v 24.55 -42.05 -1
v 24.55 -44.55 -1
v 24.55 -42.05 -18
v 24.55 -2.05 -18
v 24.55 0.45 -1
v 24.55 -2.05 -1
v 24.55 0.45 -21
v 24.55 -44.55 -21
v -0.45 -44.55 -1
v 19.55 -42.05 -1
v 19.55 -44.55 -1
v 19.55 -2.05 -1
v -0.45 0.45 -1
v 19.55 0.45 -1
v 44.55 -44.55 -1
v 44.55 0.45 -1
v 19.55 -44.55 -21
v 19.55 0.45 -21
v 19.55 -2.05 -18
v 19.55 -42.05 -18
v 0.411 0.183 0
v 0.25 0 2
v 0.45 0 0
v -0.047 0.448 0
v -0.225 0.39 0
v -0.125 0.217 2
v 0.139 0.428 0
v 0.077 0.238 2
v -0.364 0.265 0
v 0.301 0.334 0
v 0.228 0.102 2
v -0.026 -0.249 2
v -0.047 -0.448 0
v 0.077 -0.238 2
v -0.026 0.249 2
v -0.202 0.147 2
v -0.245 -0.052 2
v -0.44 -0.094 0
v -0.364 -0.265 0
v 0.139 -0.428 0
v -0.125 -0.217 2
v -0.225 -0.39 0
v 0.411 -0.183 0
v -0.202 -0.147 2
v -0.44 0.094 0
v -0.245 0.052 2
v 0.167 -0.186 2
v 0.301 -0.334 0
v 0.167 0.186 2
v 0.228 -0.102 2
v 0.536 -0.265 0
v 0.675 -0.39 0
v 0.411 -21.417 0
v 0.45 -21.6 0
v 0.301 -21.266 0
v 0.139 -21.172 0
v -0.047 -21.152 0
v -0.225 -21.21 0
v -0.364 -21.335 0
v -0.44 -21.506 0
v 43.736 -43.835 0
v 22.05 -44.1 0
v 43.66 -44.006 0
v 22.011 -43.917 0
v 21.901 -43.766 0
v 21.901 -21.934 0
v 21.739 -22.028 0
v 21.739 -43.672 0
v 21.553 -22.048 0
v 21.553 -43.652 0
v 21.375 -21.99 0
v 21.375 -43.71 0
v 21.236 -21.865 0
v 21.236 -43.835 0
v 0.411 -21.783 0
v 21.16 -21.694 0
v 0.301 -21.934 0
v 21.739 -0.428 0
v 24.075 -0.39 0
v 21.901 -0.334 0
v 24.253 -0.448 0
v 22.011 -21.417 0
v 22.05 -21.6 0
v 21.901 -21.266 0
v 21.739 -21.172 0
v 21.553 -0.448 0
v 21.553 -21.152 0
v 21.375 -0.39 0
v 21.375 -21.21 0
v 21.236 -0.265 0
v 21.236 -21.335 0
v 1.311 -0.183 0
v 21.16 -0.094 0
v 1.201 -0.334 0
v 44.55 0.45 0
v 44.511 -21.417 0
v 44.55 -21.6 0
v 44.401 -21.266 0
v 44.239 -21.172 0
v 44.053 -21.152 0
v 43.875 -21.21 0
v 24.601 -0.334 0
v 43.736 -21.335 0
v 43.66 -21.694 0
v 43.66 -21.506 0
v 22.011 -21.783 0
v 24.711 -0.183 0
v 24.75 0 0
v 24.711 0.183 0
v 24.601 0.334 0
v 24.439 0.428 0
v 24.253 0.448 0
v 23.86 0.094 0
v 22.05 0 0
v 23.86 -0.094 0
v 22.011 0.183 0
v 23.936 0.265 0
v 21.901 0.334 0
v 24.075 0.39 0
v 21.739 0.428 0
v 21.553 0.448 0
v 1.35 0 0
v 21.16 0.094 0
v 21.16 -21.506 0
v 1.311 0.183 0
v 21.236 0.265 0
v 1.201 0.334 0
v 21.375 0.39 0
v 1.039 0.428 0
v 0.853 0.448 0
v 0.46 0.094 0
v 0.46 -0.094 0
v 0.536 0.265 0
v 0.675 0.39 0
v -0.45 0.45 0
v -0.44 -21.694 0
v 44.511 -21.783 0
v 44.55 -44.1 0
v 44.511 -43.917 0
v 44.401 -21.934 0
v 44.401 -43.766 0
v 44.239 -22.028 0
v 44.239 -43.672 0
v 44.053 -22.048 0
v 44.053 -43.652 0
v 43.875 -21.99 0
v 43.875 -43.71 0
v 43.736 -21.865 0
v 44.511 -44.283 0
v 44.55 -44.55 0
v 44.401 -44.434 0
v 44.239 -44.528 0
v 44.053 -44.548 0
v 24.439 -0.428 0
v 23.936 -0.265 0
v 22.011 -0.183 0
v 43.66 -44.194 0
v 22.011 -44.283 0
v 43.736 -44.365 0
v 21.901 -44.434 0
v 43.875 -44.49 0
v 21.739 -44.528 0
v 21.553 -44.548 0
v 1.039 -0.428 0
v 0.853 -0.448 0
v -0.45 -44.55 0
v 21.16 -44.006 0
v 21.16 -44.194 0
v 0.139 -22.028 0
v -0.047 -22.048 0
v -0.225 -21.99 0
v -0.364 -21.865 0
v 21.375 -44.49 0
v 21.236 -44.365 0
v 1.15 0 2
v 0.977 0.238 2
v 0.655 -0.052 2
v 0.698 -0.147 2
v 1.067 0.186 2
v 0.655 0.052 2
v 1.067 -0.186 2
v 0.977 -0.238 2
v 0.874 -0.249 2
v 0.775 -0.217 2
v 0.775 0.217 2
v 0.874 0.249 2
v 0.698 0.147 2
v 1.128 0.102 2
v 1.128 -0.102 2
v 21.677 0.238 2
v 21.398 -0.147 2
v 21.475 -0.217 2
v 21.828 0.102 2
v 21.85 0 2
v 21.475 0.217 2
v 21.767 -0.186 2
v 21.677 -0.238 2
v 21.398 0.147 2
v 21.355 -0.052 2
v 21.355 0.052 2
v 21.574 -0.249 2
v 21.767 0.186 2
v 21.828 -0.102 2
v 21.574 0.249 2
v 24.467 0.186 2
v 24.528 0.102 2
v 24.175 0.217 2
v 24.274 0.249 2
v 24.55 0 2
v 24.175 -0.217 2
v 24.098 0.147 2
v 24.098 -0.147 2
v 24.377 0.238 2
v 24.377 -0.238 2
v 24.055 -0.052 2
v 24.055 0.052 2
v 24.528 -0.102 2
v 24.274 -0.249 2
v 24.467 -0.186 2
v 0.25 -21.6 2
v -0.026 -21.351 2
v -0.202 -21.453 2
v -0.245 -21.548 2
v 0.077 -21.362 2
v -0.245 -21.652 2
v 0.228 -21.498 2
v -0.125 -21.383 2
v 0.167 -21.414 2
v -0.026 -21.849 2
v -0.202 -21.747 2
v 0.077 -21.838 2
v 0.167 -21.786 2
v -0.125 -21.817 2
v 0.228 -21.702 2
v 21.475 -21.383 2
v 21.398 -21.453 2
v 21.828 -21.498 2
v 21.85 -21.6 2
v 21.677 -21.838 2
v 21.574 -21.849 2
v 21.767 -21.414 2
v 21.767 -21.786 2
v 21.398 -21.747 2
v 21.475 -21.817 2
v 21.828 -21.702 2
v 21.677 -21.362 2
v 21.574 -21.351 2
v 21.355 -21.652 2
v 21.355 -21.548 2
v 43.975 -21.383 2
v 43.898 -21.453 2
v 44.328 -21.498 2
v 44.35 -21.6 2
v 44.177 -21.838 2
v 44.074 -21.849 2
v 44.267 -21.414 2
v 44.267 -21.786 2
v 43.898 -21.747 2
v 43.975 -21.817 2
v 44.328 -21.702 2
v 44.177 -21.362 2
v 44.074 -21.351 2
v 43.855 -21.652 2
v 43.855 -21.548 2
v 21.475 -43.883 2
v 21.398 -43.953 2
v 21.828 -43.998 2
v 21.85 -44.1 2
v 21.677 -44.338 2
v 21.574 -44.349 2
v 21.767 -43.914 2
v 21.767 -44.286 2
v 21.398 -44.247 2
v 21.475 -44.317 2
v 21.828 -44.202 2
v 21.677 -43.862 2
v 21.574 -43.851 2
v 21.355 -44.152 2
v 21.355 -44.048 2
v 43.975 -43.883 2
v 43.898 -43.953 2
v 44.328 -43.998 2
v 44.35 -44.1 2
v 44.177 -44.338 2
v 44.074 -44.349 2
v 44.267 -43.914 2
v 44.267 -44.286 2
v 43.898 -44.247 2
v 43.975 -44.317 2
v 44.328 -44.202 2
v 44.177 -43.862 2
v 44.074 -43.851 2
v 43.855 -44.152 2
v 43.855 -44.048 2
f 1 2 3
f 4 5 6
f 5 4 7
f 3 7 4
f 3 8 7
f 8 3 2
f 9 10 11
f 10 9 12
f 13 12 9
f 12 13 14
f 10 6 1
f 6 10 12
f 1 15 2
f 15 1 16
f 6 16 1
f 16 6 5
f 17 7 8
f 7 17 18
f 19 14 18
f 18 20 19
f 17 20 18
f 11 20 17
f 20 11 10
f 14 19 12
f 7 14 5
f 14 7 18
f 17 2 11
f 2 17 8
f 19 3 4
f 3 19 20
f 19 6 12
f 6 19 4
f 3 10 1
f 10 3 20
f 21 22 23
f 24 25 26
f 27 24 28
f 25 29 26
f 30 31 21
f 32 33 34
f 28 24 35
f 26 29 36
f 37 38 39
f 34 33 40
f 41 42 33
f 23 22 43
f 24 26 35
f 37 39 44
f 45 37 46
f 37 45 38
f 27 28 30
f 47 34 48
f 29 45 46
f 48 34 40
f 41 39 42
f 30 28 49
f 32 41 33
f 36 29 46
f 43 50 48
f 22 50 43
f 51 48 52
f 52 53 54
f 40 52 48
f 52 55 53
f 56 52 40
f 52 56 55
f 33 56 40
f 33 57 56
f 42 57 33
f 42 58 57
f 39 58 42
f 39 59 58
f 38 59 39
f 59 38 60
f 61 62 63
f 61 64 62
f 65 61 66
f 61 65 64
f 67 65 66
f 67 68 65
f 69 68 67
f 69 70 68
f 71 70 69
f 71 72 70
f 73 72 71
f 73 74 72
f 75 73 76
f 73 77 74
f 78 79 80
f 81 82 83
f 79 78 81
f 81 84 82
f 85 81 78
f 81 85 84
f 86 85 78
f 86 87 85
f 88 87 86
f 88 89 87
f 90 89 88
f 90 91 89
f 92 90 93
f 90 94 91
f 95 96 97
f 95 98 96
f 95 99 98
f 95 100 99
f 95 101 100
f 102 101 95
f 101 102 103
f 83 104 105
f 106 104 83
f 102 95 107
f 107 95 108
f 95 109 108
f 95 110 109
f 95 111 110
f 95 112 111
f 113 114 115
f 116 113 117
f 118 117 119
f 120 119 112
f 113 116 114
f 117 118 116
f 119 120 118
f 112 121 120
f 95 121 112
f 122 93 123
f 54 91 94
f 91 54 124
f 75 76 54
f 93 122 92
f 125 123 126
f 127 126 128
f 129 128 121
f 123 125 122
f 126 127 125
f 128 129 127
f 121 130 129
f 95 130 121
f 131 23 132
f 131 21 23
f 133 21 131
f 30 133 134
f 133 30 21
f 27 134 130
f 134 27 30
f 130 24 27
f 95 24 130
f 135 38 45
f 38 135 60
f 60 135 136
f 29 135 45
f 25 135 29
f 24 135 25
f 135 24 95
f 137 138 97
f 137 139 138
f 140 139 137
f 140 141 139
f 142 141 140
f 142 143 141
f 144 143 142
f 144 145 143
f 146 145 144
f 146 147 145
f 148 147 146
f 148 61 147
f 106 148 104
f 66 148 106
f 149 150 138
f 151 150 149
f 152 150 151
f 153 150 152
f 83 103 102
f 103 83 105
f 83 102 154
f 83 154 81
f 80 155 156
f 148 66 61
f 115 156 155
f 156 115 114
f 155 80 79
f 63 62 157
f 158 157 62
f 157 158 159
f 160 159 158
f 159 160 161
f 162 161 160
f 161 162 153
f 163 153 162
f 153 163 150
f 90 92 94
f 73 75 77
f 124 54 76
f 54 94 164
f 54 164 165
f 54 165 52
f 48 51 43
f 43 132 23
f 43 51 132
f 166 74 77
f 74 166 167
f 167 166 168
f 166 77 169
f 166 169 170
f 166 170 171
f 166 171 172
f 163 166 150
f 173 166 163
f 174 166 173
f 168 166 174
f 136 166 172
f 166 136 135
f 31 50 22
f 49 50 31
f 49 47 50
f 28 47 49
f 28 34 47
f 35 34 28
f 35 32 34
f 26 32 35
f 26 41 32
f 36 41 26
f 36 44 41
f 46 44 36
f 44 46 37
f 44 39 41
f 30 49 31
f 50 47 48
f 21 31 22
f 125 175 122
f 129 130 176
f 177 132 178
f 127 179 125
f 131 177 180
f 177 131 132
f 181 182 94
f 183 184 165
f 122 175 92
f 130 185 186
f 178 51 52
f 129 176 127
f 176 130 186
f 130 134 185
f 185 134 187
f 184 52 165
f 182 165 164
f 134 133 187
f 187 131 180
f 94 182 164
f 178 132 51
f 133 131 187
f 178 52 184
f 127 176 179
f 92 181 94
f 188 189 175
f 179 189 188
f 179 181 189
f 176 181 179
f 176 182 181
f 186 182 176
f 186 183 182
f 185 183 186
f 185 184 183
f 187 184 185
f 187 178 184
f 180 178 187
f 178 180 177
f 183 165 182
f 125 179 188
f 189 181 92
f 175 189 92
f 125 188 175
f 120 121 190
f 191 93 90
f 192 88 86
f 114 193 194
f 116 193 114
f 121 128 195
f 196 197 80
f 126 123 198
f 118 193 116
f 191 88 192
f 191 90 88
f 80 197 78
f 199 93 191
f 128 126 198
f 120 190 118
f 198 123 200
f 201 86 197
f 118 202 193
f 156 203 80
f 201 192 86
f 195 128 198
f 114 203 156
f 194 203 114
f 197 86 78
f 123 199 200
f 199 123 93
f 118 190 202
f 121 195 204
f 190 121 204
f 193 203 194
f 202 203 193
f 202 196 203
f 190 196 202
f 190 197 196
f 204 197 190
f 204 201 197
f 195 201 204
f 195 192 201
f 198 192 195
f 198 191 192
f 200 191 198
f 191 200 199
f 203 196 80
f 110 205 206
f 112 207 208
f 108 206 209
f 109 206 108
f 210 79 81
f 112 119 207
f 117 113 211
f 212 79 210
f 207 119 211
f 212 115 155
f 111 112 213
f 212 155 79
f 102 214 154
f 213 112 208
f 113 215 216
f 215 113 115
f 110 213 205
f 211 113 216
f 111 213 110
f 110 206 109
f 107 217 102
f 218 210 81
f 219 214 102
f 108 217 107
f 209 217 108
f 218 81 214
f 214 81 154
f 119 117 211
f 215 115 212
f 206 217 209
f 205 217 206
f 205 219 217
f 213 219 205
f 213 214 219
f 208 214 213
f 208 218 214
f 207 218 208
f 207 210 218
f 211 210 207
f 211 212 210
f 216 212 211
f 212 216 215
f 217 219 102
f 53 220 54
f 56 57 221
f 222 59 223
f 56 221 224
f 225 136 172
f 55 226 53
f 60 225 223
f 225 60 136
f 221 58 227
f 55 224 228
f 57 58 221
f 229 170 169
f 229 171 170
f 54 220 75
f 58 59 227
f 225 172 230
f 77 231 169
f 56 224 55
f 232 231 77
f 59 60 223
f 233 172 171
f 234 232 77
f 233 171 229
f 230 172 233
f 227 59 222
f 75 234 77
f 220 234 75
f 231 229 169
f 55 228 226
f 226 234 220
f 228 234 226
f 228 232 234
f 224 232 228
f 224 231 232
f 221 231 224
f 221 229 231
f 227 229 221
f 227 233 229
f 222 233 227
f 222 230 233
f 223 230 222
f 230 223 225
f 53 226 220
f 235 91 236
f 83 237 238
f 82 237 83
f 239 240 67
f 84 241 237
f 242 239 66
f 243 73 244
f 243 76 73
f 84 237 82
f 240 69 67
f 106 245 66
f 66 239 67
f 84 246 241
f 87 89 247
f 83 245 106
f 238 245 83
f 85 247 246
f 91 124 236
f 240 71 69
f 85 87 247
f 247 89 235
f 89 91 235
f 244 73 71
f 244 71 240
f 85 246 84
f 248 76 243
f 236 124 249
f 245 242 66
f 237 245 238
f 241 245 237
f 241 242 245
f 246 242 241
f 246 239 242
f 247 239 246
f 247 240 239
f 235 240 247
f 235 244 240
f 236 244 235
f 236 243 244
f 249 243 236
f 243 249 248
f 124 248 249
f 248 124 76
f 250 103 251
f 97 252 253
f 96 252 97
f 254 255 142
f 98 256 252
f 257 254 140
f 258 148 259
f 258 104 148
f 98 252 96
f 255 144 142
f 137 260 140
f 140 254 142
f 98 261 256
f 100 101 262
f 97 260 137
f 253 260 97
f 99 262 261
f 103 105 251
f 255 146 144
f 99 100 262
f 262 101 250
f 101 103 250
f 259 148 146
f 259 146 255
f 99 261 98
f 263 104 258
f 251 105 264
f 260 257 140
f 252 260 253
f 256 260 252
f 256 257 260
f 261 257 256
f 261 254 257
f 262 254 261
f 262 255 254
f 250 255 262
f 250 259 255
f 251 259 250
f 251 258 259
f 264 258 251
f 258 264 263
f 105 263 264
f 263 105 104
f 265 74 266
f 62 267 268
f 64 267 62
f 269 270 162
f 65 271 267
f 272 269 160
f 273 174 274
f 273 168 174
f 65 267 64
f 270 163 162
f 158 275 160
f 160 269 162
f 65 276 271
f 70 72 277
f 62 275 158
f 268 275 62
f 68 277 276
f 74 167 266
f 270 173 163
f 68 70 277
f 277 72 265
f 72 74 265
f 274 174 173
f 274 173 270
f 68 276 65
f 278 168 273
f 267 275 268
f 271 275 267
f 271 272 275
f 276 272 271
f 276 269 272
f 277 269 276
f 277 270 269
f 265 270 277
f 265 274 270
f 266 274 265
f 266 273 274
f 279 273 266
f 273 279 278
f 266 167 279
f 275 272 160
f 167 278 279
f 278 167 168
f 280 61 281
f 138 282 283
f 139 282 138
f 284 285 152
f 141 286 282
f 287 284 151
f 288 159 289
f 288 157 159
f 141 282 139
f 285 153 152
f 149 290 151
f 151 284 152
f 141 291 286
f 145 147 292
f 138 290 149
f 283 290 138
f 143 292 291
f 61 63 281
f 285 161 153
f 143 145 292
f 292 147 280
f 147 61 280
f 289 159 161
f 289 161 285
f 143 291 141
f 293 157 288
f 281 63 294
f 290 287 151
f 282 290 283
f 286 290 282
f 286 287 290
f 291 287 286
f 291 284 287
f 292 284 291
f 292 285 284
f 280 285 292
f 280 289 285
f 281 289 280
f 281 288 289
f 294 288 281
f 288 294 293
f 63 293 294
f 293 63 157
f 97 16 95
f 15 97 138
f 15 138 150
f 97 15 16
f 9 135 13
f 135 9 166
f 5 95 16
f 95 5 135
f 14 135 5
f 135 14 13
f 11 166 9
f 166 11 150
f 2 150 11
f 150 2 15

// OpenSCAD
$fn=15;
gridLength = 45;
gridSquares = 50;
oneGridLength = gridLength / gridSquares;
platformThickness = 1;
handleThickness = 5;
handleHeight = 20;

module buildPlatform(){
  translate([22.05,-22.05, -0.5 * platformThickness])
  cube([45,45,platformThickness], center = true);  
    
}

module buildHandle(){
    translate([22.05,-22.05,-0.5 * handleHeight - platformThickness])
    difference(){
        cube([handleThickness, 45, handleHeight], center = true);
        translate([0,0,4])
        cube([handleThickness + 1, 40, 22], center = true);
    }
    
}   

module buildStamp(array){
  buildPlatform();
  buildHandle();
  
  for ( row=[0:1:gridSquares - 1]) {
    for ( col=[0:1:gridSquares - 1]) {
      if(array[row][col] == 1){
        translate([col * oneGridLength,row * -1 * oneGridLength,0])
        cylinder(h=2,d1=oneGridLength, d2 = 0.5);
      }   
    }
  }
  
    
}

buildStamp(receiver_array);

receiver_array = [[1, 1, 0, 0, 0, 0, 0, 0, 0, 0, 0, 0, 0, 0, 0, 0, 0, 0, 0, 0, 0, 0, 0, 0, 1, 0, 0, 1, 0, 0, 0, 0, 0, 0, 0, 0, 0, 0, 0, 0, 0, 0, 0, 0, 0, 0, 0, 0, 0, 0], [0, 0, 0, 0, 0, 0, 0, 0, 0, 0, 0, 0, 0, 0, 0, 0, 0, 0, 0, 0, 0, 0, 0, 0, 0, 0, 0, 0, 0, 0, 0, 0, 0, 0, 0, 0, 0, 0, 0, 0, 0, 0, 0, 0, 0, 0, 0, 0, 0, 0], [0, 0, 0, 0, 0, 0, 0, 0, 0, 0, 0, 0, 0, 0, 0, 0, 0, 0, 0, 0, 0, 0, 0, 0, 0, 0, 0, 0, 0, 0, 0, 0, 0, 0, 0, 0, 0, 0, 0, 0, 0, 0, 0, 0, 0, 0, 0, 0, 0, 0], [0, 0, 0, 0, 0, 0, 0, 0, 0, 0, 0, 0, 0, 0, 0, 0, 0, 0, 0, 0, 0, 0, 0, 0, 0, 0, 0, 0, 0, 0, 0, 0, 0, 0, 0, 0, 0, 0, 0, 0, 0, 0, 0, 0, 0, 0, 0, 0, 0, 0], [0, 0, 0, 0, 0, 0, 0, 0, 0, 0, 0, 0, 0, 0, 0, 0, 0, 0, 0, 0, 0, 0, 0, 0, 0, 0, 0, 0, 0, 0, 0, 0, 0, 0, 0, 0, 0, 0, 0, 0, 0, 0, 0, 0, 0, 0, 0, 0, 0, 0], [0, 0, 0, 0, 0, 0, 0, 0, 0, 0, 0, 0, 0, 0, 0, 0, 0, 0, 0, 0, 0, 0, 0, 0, 0, 0, 0, 0, 0, 0, 0, 0, 0, 0, 0, 0, 0, 0, 0, 0, 0, 0, 0, 0, 0, 0, 0, 0, 0, 0], [0, 0, 0, 0, 0, 0, 0, 0, 0, 0, 0, 0, 0, 0, 0, 0, 0, 0, 0, 0, 0, 0, 0, 0, 0, 0, 0, 0, 0, 0, 0, 0, 0, 0, 0, 0, 0, 0, 0, 0, 0, 0, 0, 0, 0, 0, 0, 0, 0, 0], [0, 0, 0, 0, 0, 0, 0, 0, 0, 0, 0, 0, 0, 0, 0, 0, 0, 0, 0, 0, 0, 0, 0, 0, 0, 0, 0, 0, 0, 0, 0, 0, 0, 0, 0, 0, 0, 0, 0, 0, 0, 0, 0, 0, 0, 0, 0, 0, 0, 0], [0, 0, 0, 0, 0, 0, 0, 0, 0, 0, 0, 0, 0, 0, 0, 0, 0, 0, 0, 0, 0, 0, 0, 0, 0, 0, 0, 0, 0, 0, 0, 0, 0, 0, 0, 0, 0, 0, 0, 0, 0, 0, 0, 0, 0, 0, 0, 0, 0, 0], [0, 0, 0, 0, 0, 0, 0, 0, 0, 0, 0, 0, 0, 0, 0, 0, 0, 0, 0, 0, 0, 0, 0, 0, 0, 0, 0, 0, 0, 0, 0, 0, 0, 0, 0, 0, 0, 0, 0, 0, 0, 0, 0, 0, 0, 0, 0, 0, 0, 0], [0, 0, 0, 0, 0, 0, 0, 0, 0, 0, 0, 0, 0, 0, 0, 0, 0, 0, 0, 0, 0, 0, 0, 0, 0, 0, 0, 0, 0, 0, 0, 0, 0, 0, 0, 0, 0, 0, 0, 0, 0, 0, 0, 0, 0, 0, 0, 0, 0, 0], [0, 0, 0, 0, 0, 0, 0, 0, 0, 0, 0, 0, 0, 0, 0, 0, 0, 0, 0, 0, 0, 0, 0, 0, 0, 0, 0, 0, 0, 0, 0, 0, 0, 0, 0, 0, 0, 0, 0, 0, 0, 0, 0, 0, 0, 0, 0, 0, 0, 0], [0, 0, 0, 0, 0, 0, 0, 0, 0, 0, 0, 0, 0, 0, 0, 0, 0, 0, 0, 0, 0, 0, 0, 0, 0, 0, 0, 0, 0, 0, 0, 0, 0, 0, 0, 0, 0, 0, 0, 0, 0, 0, 0, 0, 0, 0, 0, 0, 0, 0], [0, 0, 0, 0, 0, 0, 0, 0, 0, 0, 0, 0, 0, 0, 0, 0, 0, 0, 0, 0, 0, 0, 0, 0, 0, 0, 0, 0, 0, 0, 0, 0, 0, 0, 0, 0, 0, 0, 0, 0, 0, 0, 0, 0, 0, 0, 0, 0, 0, 0], [0, 0, 0, 0, 0, 0, 0, 0, 0, 0, 0, 0, 0, 0, 0, 0, 0, 0, 0, 0, 0, 0, 0, 0, 0, 0, 0, 0, 0, 0, 0, 0, 0, 0, 0, 0, 0, 0, 0, 0, 0, 0, 0, 0, 0, 0, 0, 0, 0, 0], [0, 0, 0, 0, 0, 0, 0, 0, 0, 0, 0, 0, 0, 0, 0, 0, 0, 0, 0, 0, 0, 0, 0, 0, 0, 0, 0, 0, 0, 0, 0, 0, 0, 0, 0, 0, 0, 0, 0, 0, 0, 0, 0, 0, 0, 0, 0, 0, 0, 0], [0, 0, 0, 0, 0, 0, 0, 0, 0, 0, 0, 0, 0, 0, 0, 0, 0, 0, 0, 0, 0, 0, 0, 0, 0, 0, 0, 0, 0, 0, 0, 0, 0, 0, 0, 0, 0, 0, 0, 0, 0, 0, 0, 0, 0, 0, 0, 0, 0, 0], [0, 0, 0, 0, 0, 0, 0, 0, 0, 0, 0, 0, 0, 0, 0, 0, 0, 0, 0, 0, 0, 0, 0, 0, 0, 0, 0, 0, 0, 0, 0, 0, 0, 0, 0, 0, 0, 0, 0, 0, 0, 0, 0, 0, 0, 0, 0, 0, 0, 0], [0, 0, 0, 0, 0, 0, 0, 0, 0, 0, 0, 0, 0, 0, 0, 0, 0, 0, 0, 0, 0, 0, 0, 0, 0, 0, 0, 0, 0, 0, 0, 0, 0, 0, 0, 0, 0, 0, 0, 0, 0, 0, 0, 0, 0, 0, 0, 0, 0, 0], [0, 0, 0, 0, 0, 0, 0, 0, 0, 0, 0, 0, 0, 0, 0, 0, 0, 0, 0, 0, 0, 0, 0, 0, 0, 0, 0, 0, 0, 0, 0, 0, 0, 0, 0, 0, 0, 0, 0, 0, 0, 0, 0, 0, 0, 0, 0, 0, 0, 0], [0, 0, 0, 0, 0, 0, 0, 0, 0, 0, 0, 0, 0, 0, 0, 0, 0, 0, 0, 0, 0, 0, 0, 0, 0, 0, 0, 0, 0, 0, 0, 0, 0, 0, 0, 0, 0, 0, 0, 0, 0, 0, 0, 0, 0, 0, 0, 0, 0, 0], [0, 0, 0, 0, 0, 0, 0, 0, 0, 0, 0, 0, 0, 0, 0, 0, 0, 0, 0, 0, 0, 0, 0, 0, 0, 0, 0, 0, 0, 0, 0, 0, 0, 0, 0, 0, 0, 0, 0, 0, 0, 0, 0, 0, 0, 0, 0, 0, 0, 0], [0, 0, 0, 0, 0, 0, 0, 0, 0, 0, 0, 0, 0, 0, 0, 0, 0, 0, 0, 0, 0, 0, 0, 0, 0, 0, 0, 0, 0, 0, 0, 0, 0, 0, 0, 0, 0, 0, 0, 0, 0, 0, 0, 0, 0, 0, 0, 0, 0, 0], [0, 0, 0, 0, 0, 0, 0, 0, 0, 0, 0, 0, 0, 0, 0, 0, 0, 0, 0, 0, 0, 0, 0, 0, 0, 0, 0, 0, 0, 0, 0, 0, 0, 0, 0, 0, 0, 0, 0, 0, 0, 0, 0, 0, 0, 0, 0, 0, 0, 0], [1, 0, 0, 0, 0, 0, 0, 0, 0, 0, 0, 0, 0, 0, 0, 0, 0, 0, 0, 0, 0, 0, 0, 0, 1, 0, 0, 0, 0, 0, 0, 0, 0, 0, 0, 0, 0, 0, 0, 0, 0, 0, 0, 0, 0, 0, 0, 0, 0, 1], [0, 0, 0, 0, 0, 0, 0, 0, 0, 0, 0, 0, 0, 0, 0, 0, 0, 0, 0, 0, 0, 0, 0, 0, 0, 0, 0, 0, 0, 0, 0, 0, 0, 0, 0, 0, 0, 0, 0, 0, 0, 0, 0, 0, 0, 0, 0, 0, 0, 0], [0, 0, 0, 0, 0, 0, 0, 0, 0, 0, 0, 0, 0, 0, 0, 0, 0, 0, 0, 0, 0, 0, 0, 0, 0, 0, 0, 0, 0, 0, 0, 0, 0, 0, 0, 0, 0, 0, 0, 0, 0, 0, 0, 0, 0, 0, 0, 0, 0, 0], [0, 0, 0, 0, 0, 0, 0, 0, 0, 0, 0, 0, 0, 0, 0, 0, 0, 0, 0, 0, 0, 0, 0, 0, 0, 0, 0, 0, 0, 0, 0, 0, 0, 0, 0, 0, 0, 0, 0, 0, 0, 0, 0, 0, 0, 0, 0, 0, 0, 0], [0, 0, 0, 0, 0, 0, 0, 0, 0, 0, 0, 0, 0, 0, 0, 0, 0, 0, 0, 0, 0, 0, 0, 0, 0, 0, 0, 0, 0, 0, 0, 0, 0, 0, 0, 0, 0, 0, 0, 0, 0, 0, 0, 0, 0, 0, 0, 0, 0, 0], [0, 0, 0, 0, 0, 0, 0, 0, 0, 0, 0, 0, 0, 0, 0, 0, 0, 0, 0, 0, 0, 0, 0, 0, 0, 0, 0, 0, 0, 0, 0, 0, 0, 0, 0, 0, 0, 0, 0, 0, 0, 0, 0, 0, 0, 0, 0, 0, 0, 0], [0, 0, 0, 0, 0, 0, 0, 0, 0, 0, 0, 0, 0, 0, 0, 0, 0, 0, 0, 0, 0, 0, 0, 0, 0, 0, 0, 0, 0, 0, 0, 0, 0, 0, 0, 0, 0, 0, 0, 0, 0, 0, 0, 0, 0, 0, 0, 0, 0, 0], [0, 0, 0, 0, 0, 0, 0, 0, 0, 0, 0, 0, 0, 0, 0, 0, 0, 0, 0, 0, 0, 0, 0, 0, 0, 0, 0, 0, 0, 0, 0, 0, 0, 0, 0, 0, 0, 0, 0, 0, 0, 0, 0, 0, 0, 0, 0, 0, 0, 0], [0, 0, 0, 0, 0, 0, 0, 0, 0, 0, 0, 0, 0, 0, 0, 0, 0, 0, 0, 0, 0, 0, 0, 0, 0, 0, 0, 0, 0, 0, 0, 0, 0, 0, 0, 0, 0, 0, 0, 0, 0, 0, 0, 0, 0, 0, 0, 0, 0, 0], [0, 0, 0, 0, 0, 0, 0, 0, 0, 0, 0, 0, 0, 0, 0, 0, 0, 0, 0, 0, 0, 0, 0, 0, 0, 0, 0, 0, 0, 0, 0, 0, 0, 0, 0, 0, 0, 0, 0, 0, 0, 0, 0, 0, 0, 0, 0, 0, 0, 0], [0, 0, 0, 0, 0, 0, 0, 0, 0, 0, 0, 0, 0, 0, 0, 0, 0, 0, 0, 0, 0, 0, 0, 0, 0, 0, 0, 0, 0, 0, 0, 0, 0, 0, 0, 0, 0, 0, 0, 0, 0, 0, 0, 0, 0, 0, 0, 0, 0, 0], [0, 0, 0, 0, 0, 0, 0, 0, 0, 0, 0, 0, 0, 0, 0, 0, 0, 0, 0, 0, 0, 0, 0, 0, 0, 0, 0, 0, 0, 0, 0, 0, 0, 0, 0, 0, 0, 0, 0, 0, 0, 0, 0, 0, 0, 0, 0, 0, 0, 0], [0, 0, 0, 0, 0, 0, 0, 0, 0, 0, 0, 0, 0, 0, 0, 0, 0, 0, 0, 0, 0, 0, 0, 0, 0, 0, 0, 0, 0, 0, 0, 0, 0, 0, 0, 0, 0, 0, 0, 0, 0, 0, 0, 0, 0, 0, 0, 0, 0, 0], [0, 0, 0, 0, 0, 0, 0, 0, 0, 0, 0, 0, 0, 0, 0, 0, 0, 0, 0, 0, 0, 0, 0, 0, 0, 0, 0, 0, 0, 0, 0, 0, 0, 0, 0, 0, 0, 0, 0, 0, 0, 0, 0, 0, 0, 0, 0, 0, 0, 0], [0, 0, 0, 0, 0, 0, 0, 0, 0, 0, 0, 0, 0, 0, 0, 0, 0, 0, 0, 0, 0, 0, 0, 0, 0, 0, 0, 0, 0, 0, 0, 0, 0, 0, 0, 0, 0, 0, 0, 0, 0, 0, 0, 0, 0, 0, 0, 0, 0, 0], [0, 0, 0, 0, 0, 0, 0, 0, 0, 0, 0, 0, 0, 0, 0, 0, 0, 0, 0, 0, 0, 0, 0, 0, 0, 0, 0, 0, 0, 0, 0, 0, 0, 0, 0, 0, 0, 0, 0, 0, 0, 0, 0, 0, 0, 0, 0, 0, 0, 0], [0, 0, 0, 0, 0, 0, 0, 0, 0, 0, 0, 0, 0, 0, 0, 0, 0, 0, 0, 0, 0, 0, 0, 0, 0, 0, 0, 0, 0, 0, 0, 0, 0, 0, 0, 0, 0, 0, 0, 0, 0, 0, 0, 0, 0, 0, 0, 0, 0, 0], [0, 0, 0, 0, 0, 0, 0, 0, 0, 0, 0, 0, 0, 0, 0, 0, 0, 0, 0, 0, 0, 0, 0, 0, 0, 0, 0, 0, 0, 0, 0, 0, 0, 0, 0, 0, 0, 0, 0, 0, 0, 0, 0, 0, 0, 0, 0, 0, 0, 0], [0, 0, 0, 0, 0, 0, 0, 0, 0, 0, 0, 0, 0, 0, 0, 0, 0, 0, 0, 0, 0, 0, 0, 0, 0, 0, 0, 0, 0, 0, 0, 0, 0, 0, 0, 0, 0, 0, 0, 0, 0, 0, 0, 0, 0, 0, 0, 0, 0, 0], [0, 0, 0, 0, 0, 0, 0, 0, 0, 0, 0, 0, 0, 0, 0, 0, 0, 0, 0, 0, 0, 0, 0, 0, 0, 0, 0, 0, 0, 0, 0, 0, 0, 0, 0, 0, 0, 0, 0, 0, 0, 0, 0, 0, 0, 0, 0, 0, 0, 0], [0, 0, 0, 0, 0, 0, 0, 0, 0, 0, 0, 0, 0, 0, 0, 0, 0, 0, 0, 0, 0, 0, 0, 0, 0, 0, 0, 0, 0, 0, 0, 0, 0, 0, 0, 0, 0, 0, 0, 0, 0, 0, 0, 0, 0, 0, 0, 0, 0, 0], [0, 0, 0, 0, 0, 0, 0, 0, 0, 0, 0, 0, 0, 0, 0, 0, 0, 0, 0, 0, 0, 0, 0, 0, 0, 0, 0, 0, 0, 0, 0, 0, 0, 0, 0, 0, 0, 0, 0, 0, 0, 0, 0, 0, 0, 0, 0, 0, 0, 0], [0, 0, 0, 0, 0, 0, 0, 0, 0, 0, 0, 0, 0, 0, 0, 0, 0, 0, 0, 0, 0, 0, 0, 0, 0, 0, 0, 0, 0, 0, 0, 0, 0, 0, 0, 0, 0, 0, 0, 0, 0, 0, 0, 0, 0, 0, 0, 0, 0, 0], [0, 0, 0, 0, 0, 0, 0, 0, 0, 0, 0, 0, 0, 0, 0, 0, 0, 0, 0, 0, 0, 0, 0, 0, 0, 0, 0, 0, 0, 0, 0, 0, 0, 0, 0, 0, 0, 0, 0, 0, 0, 0, 0, 0, 0, 0, 0, 0, 0, 0], [0, 0, 0, 0, 0, 0, 0, 0, 0, 0, 0, 0, 0, 0, 0, 0, 0, 0, 0, 0, 0, 0, 0, 0, 0, 0, 0, 0, 0, 0, 0, 0, 0, 0, 0, 0, 0, 0, 0, 0, 0, 0, 0, 0, 0, 0, 0, 0, 0, 0], [0, 0, 0, 0, 0, 0, 0, 0, 0, 0, 0, 0, 0, 0, 0, 0, 0, 0, 0, 0, 0, 0, 0, 0, 1, 0, 0, 0, 0, 0, 0, 0, 0, 0, 0, 0, 0, 0, 0, 0, 0, 0, 0, 0, 0, 0, 0, 0, 0, 1]] ;
